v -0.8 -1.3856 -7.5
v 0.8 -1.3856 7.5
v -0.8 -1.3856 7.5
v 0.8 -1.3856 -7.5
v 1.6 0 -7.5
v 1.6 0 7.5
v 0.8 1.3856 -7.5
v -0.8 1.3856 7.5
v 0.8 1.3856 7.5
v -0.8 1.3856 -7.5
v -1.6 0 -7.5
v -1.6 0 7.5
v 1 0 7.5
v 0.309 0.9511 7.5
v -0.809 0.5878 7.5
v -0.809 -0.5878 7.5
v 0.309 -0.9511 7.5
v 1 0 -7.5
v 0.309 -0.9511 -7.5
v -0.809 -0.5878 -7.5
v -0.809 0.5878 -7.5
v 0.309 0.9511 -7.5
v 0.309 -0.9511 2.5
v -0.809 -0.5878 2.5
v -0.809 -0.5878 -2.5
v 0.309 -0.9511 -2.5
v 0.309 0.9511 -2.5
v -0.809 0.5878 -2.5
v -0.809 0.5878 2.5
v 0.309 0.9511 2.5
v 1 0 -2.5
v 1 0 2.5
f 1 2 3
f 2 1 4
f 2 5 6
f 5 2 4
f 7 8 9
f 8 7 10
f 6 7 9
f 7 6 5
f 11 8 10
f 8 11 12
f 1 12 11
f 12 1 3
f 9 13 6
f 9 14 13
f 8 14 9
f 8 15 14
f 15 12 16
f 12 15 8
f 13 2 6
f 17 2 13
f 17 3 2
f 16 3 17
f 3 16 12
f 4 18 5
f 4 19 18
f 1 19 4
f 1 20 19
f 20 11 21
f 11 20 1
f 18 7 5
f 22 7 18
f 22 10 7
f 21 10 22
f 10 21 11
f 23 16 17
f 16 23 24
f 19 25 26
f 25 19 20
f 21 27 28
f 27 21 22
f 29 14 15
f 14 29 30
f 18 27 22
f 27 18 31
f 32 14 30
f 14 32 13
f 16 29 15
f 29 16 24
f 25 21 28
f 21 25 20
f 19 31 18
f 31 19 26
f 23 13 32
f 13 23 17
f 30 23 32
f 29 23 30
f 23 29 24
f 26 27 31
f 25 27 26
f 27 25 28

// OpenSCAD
// Parameters
length = 15; //[8:30:1]
original_id = 2; //[1:4:0.1]
original_od = 3.2; //[1.6:6.4:0.1]
forced_id = 0; //[0:6:0.1]
center = 1; //[0:1:1]
overlap = 1; //[0.5:2:0.1]

// Tubing - complete geometry
module tubing() {
  color([0.85, 0.85, 0.8]) { // Off-white for heatshrink
    difference() {
      // Outer sleeve
      translate([0, 0, (center > 0 ? 0 : length / 2)])
        cylinder(h=length, r=((original_od + (forced_id > 0 ? (forced_id - original_id) : 0)))/2, center=true);
      // Inner bore
      translate([0, 0, (center > 0 ? 0 : length / 2)])
        cylinder(h=length + 2 * overlap, r=((forced_id > 0 ? forced_id : original_id))/2, center=true);
    }
  }
}

// Sleeved Resistor - placeholder geometry
module sleeved_resistor() {
  color([0.2, 0.2, 0.2]) { // Dark color for resistor
    // Placeholder for resistor
    translate([0, 0, (center > 0 ? 0 : length / 2)])
      cylinder(h=5, r=original_id/2, center=true);
  }
}

// Assembly
module assembly() {
  tubing();
  translate([0, 0, 0]) sleeved_resistor();
}

assembly();
